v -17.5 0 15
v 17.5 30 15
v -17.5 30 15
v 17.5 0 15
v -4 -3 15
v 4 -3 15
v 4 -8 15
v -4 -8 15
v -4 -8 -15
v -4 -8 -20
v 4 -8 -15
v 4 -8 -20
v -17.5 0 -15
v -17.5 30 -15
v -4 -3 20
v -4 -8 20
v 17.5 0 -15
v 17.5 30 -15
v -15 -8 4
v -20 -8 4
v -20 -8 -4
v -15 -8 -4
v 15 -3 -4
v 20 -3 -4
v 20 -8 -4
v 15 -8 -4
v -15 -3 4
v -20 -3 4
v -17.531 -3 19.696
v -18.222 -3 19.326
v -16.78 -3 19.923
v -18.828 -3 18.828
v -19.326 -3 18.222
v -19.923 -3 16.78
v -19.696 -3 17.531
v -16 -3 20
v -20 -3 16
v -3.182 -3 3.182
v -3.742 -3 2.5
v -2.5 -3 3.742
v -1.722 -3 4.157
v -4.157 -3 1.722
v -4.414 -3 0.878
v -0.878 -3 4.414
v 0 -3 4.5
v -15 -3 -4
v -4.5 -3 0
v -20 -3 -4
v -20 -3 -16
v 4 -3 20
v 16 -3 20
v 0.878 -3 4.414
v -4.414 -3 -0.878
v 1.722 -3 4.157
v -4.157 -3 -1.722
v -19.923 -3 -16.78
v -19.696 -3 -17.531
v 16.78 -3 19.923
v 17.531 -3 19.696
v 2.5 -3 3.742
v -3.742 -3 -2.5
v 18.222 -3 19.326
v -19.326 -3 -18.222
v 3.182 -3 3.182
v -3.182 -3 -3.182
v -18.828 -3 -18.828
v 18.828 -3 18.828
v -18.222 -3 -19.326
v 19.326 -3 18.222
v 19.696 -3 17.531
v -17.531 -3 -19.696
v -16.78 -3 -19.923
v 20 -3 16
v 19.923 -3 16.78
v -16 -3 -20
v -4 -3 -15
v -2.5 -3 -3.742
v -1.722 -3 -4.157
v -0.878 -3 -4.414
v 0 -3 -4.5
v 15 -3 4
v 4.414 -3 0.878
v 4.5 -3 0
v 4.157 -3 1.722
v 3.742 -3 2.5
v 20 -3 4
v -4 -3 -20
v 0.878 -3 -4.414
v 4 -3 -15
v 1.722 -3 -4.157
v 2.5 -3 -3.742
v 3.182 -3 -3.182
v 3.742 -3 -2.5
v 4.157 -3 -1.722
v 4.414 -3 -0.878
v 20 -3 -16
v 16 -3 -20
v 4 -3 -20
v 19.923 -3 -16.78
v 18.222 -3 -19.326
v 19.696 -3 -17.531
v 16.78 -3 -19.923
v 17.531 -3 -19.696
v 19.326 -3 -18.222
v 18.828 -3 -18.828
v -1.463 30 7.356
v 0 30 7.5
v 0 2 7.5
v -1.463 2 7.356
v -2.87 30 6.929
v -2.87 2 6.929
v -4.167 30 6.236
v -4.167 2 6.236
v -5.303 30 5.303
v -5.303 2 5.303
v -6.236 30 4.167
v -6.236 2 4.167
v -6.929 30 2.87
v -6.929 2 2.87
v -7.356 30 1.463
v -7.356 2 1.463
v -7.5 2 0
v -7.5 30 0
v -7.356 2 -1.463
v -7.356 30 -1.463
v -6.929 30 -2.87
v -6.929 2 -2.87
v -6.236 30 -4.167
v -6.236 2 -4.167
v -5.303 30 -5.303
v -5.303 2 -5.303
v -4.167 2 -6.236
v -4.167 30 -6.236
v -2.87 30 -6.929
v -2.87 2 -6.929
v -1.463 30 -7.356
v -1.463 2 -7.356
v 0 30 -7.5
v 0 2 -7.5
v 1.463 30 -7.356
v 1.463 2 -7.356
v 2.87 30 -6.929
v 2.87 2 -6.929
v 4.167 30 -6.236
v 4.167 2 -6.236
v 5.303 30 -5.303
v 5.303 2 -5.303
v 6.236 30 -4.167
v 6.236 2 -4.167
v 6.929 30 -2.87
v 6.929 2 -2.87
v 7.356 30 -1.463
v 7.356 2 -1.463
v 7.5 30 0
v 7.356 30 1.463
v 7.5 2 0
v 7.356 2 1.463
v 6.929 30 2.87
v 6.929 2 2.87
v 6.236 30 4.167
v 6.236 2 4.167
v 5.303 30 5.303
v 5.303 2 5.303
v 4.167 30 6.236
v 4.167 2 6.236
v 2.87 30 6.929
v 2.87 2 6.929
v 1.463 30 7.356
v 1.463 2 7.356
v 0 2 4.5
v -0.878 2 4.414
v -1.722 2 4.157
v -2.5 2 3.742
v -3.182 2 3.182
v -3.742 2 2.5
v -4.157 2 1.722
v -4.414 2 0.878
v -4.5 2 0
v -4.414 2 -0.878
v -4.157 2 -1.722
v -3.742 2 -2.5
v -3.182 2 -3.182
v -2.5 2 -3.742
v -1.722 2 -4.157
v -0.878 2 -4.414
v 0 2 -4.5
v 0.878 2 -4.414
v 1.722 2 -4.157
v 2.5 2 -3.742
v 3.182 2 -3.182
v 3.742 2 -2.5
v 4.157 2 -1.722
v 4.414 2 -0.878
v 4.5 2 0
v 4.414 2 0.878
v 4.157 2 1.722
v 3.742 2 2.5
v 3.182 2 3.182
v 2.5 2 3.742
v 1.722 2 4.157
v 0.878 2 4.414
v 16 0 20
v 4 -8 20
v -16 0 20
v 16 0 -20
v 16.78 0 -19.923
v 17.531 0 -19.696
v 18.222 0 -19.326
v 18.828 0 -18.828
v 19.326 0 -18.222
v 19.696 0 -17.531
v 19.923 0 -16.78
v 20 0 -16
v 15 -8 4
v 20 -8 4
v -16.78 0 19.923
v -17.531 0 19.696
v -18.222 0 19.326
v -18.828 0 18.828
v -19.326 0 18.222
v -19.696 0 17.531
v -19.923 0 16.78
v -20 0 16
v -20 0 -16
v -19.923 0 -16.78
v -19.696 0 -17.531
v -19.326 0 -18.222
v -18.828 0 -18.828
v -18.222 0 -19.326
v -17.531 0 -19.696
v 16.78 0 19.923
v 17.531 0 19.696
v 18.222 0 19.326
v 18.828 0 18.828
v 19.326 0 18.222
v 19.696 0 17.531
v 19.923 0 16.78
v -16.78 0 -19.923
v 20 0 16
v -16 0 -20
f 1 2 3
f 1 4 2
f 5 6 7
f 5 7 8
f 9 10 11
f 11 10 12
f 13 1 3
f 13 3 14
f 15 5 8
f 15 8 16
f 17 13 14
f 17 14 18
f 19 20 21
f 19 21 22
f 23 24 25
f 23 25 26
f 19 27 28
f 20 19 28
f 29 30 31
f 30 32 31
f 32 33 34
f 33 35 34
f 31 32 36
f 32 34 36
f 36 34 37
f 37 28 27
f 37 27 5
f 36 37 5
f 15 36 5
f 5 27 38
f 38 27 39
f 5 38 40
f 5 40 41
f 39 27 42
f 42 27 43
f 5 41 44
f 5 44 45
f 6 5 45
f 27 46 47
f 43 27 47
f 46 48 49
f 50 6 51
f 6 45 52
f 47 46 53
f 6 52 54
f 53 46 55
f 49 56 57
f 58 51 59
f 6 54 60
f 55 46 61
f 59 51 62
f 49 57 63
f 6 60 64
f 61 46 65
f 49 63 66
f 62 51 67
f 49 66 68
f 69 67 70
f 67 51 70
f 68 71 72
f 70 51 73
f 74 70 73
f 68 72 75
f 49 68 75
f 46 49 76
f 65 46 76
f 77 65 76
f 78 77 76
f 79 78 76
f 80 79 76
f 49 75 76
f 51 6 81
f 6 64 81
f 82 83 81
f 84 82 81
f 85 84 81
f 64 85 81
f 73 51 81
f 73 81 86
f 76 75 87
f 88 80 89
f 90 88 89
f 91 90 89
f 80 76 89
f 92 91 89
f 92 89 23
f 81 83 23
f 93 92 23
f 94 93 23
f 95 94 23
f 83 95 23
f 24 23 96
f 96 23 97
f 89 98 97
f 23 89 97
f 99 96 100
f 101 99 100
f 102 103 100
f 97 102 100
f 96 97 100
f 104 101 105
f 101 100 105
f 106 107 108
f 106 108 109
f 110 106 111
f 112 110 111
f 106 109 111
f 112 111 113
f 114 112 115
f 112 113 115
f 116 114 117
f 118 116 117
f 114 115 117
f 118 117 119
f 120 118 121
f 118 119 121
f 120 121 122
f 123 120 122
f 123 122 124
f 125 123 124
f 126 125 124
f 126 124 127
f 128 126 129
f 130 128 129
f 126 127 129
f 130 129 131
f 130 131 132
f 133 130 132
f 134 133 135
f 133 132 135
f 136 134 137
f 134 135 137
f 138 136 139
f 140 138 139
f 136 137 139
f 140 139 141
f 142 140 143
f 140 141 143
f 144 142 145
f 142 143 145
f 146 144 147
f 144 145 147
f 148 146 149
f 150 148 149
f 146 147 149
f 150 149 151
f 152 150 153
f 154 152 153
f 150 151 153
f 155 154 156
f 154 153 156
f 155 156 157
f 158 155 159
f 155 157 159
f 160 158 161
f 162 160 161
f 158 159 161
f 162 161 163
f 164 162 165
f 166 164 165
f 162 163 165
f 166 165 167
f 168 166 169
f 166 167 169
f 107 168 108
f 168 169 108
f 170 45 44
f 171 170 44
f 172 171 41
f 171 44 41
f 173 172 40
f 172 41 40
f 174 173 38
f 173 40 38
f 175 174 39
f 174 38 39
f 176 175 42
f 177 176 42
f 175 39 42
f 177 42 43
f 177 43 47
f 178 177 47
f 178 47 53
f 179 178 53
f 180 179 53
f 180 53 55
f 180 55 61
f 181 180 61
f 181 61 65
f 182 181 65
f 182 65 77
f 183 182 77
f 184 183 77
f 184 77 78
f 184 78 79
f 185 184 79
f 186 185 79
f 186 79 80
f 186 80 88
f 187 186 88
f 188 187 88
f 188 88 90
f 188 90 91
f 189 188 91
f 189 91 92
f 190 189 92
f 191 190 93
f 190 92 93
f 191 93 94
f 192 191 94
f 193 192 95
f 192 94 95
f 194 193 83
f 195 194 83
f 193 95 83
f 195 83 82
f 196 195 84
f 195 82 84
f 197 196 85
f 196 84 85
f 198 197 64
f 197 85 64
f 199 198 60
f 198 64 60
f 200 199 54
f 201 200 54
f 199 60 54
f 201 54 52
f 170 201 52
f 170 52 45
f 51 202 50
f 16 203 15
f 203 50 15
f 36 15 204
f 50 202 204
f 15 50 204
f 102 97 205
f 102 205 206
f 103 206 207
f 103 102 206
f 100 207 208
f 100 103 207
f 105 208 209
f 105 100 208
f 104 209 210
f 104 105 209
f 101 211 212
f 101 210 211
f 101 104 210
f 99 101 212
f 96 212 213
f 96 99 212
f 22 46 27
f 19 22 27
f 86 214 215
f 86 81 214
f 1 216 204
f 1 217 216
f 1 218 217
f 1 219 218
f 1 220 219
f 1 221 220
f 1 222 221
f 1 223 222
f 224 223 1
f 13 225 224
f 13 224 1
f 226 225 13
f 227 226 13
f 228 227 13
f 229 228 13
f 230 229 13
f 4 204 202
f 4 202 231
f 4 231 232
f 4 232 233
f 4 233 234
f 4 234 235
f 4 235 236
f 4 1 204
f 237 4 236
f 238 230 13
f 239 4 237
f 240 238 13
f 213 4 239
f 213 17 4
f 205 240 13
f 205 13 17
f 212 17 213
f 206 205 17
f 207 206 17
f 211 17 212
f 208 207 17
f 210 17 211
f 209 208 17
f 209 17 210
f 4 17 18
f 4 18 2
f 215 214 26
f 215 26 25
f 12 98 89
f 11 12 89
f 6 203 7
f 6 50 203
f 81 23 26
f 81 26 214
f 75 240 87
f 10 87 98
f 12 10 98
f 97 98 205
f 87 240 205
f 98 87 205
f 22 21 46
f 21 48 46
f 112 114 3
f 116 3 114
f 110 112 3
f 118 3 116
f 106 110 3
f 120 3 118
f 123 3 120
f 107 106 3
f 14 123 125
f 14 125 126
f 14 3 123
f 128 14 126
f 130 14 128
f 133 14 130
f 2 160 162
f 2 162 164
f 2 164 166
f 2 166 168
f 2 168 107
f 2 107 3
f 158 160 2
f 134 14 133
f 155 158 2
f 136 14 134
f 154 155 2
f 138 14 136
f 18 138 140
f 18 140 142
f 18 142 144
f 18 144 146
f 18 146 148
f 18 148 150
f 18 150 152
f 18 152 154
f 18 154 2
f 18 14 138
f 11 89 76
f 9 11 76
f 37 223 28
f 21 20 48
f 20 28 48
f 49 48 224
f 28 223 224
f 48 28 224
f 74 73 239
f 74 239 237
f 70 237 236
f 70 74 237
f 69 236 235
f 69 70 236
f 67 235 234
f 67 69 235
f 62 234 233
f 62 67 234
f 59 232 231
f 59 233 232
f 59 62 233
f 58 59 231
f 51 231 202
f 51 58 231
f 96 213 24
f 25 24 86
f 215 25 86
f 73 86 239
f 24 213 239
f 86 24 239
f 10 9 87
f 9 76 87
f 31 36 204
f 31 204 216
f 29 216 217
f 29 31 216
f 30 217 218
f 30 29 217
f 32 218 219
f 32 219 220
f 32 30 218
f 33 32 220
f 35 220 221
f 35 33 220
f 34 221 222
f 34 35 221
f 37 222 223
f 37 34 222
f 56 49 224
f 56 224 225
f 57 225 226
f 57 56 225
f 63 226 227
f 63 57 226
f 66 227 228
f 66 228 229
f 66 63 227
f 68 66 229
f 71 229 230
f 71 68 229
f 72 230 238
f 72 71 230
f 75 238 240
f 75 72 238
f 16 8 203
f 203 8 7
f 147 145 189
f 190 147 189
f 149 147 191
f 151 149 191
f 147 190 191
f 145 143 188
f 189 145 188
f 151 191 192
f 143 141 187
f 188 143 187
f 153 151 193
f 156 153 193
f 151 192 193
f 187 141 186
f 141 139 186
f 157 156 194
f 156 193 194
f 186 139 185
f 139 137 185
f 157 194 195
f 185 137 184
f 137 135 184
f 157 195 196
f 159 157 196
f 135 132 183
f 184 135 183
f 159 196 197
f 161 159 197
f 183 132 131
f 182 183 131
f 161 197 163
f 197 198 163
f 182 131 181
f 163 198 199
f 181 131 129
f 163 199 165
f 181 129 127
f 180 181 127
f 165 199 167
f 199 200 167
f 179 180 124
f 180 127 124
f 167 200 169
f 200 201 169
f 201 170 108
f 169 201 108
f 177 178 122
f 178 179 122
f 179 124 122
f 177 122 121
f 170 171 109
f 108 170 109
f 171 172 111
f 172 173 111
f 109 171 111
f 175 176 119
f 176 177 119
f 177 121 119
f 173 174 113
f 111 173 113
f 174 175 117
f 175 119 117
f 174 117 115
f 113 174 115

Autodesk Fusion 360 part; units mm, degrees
sketch "Sketch1" plane through (0, 0, 0) normal (0, 1, 0) x (1, 0, 0)
  line L0 (20, -20) -> (-20, -20)
  line L1 (-20, -20) -> (-20, 20)
  line L2 (-20, 20) -> (20, 20)
  line L3 (20, 20) -> (20, -20)
  line L4 (20, -20) -> (-20, 20) construction
  line L5 (-20, -20) -> (20, 20) construction
  line L6 (-20, 4) -> (-15, 4)
  line L7 (-15, 4) -> (-15, -4)
  line L8 (-15, -4) -> (-20, -4)
  line L9 (-20, -4) -> (-20, 4)
  line L10 (-4, 20) -> (4, 20)
  line L11 (4, 20) -> (4, 15)
  line L12 (4, 15) -> (-4, 15)
  line L13 (-4, 15) -> (-4, 20)
  line L14 (20, 4) -> (15, 4)
  line L15 (15, 4) -> (15, -4)
  line L16 (15, -4) -> (20, -4)
  line L17 (20, -4) -> (20, 4)
  line L18 (-4, -20) -> (4, -20)
  line L19 (4, -20) -> (4, -15)
  line L20 (4, -15) -> (-4, -15)
  line L21 (-4, -15) -> (-4, -20)
  dimension "d1" = 40
  dimension "d2" = 40
  dimension "d3" = 5
  dimension "d4" = 8
  dimension "d5" = 16
  dimension "d6" = 5
  dimension "d7" = 16
  dimension "d8" = 8
  dimension "d9" = 5
  dimension "d10" = 5
  dimension "d11" = 8
  dimension "d12" = 8
  dimension "d13" = 16
  dimension "d14" = 16
extrude "Extrude1" add sketch "Sketch1" against normal blind 3 contours L0 L1 L2 L3 L6 L7 L8 L11 L12 L13 L14 L15 L16 L19 L20 L21
extrude "Extrude2" add sketch "Sketch1" against normal blind 8 contours L0 L18 L19 L20 L21 | L3 L14 L15 L16 L17 | L1 L6 L7 L8 L9 | L2 L10 L11 L12 L13
hole "Hole1" at (0, 0, 0) direction (0, -1, 0) diameter 9 depth 30 tip angle 118
fillet "Fillet1" radius 4 4 edges at (20, -1.5, -20) (-20, -1.5, -20) (20, -1.5, 20) (-20, -1.5, 20)
sketch "Sketch2" plane through (0, 0, 0) normal (0, 1, 0) x (1, 0, 0)
  line L0 (-17.5, 15) -> (17.5, 15)
  line L1 (17.5, 15) -> (17.5, -15)
  line L2 (17.5, -15) -> (-17.5, -15)
  line L3 (-17.5, -15) -> (-17.5, 15)
  dimension "d24" = 35
  dimension "d25" = 30
  dimension "d26" = 15
  dimension "d27" = 17.5
extrude "Extrude3" add sketch "Sketch2" along normal blind 30
sketch "Sketch3" plane through (0, 30, 0) normal (0, 1, 0) x (-1, 0, 0)
  line L0 (17.5, 15) -> (-17.5, 15)
  line L1 (-17.5, 15) -> (-17.5, -15)
  line L2 (-17.5, -15) -> (17.5, -15)
  line L3 (17.5, -15) -> (17.5, 15)
  circle A0 centre (0, 0) radius 4.5
hole "Hole2" at (0, 30, 0) direction (0, -1, 0) diameter 9 depth 90 tip angle 118 counterbore diameter 15 counterbore depth 28
equation "d6 = d3"
equation "d7 = d5"
equation "d8 = d4"
equation "d9 = d3"
equation "d10 = d3"
equation "d11 = d4"
equation "d12 = d4"
equation "d13 = d7"
equation "d14 = d7"
